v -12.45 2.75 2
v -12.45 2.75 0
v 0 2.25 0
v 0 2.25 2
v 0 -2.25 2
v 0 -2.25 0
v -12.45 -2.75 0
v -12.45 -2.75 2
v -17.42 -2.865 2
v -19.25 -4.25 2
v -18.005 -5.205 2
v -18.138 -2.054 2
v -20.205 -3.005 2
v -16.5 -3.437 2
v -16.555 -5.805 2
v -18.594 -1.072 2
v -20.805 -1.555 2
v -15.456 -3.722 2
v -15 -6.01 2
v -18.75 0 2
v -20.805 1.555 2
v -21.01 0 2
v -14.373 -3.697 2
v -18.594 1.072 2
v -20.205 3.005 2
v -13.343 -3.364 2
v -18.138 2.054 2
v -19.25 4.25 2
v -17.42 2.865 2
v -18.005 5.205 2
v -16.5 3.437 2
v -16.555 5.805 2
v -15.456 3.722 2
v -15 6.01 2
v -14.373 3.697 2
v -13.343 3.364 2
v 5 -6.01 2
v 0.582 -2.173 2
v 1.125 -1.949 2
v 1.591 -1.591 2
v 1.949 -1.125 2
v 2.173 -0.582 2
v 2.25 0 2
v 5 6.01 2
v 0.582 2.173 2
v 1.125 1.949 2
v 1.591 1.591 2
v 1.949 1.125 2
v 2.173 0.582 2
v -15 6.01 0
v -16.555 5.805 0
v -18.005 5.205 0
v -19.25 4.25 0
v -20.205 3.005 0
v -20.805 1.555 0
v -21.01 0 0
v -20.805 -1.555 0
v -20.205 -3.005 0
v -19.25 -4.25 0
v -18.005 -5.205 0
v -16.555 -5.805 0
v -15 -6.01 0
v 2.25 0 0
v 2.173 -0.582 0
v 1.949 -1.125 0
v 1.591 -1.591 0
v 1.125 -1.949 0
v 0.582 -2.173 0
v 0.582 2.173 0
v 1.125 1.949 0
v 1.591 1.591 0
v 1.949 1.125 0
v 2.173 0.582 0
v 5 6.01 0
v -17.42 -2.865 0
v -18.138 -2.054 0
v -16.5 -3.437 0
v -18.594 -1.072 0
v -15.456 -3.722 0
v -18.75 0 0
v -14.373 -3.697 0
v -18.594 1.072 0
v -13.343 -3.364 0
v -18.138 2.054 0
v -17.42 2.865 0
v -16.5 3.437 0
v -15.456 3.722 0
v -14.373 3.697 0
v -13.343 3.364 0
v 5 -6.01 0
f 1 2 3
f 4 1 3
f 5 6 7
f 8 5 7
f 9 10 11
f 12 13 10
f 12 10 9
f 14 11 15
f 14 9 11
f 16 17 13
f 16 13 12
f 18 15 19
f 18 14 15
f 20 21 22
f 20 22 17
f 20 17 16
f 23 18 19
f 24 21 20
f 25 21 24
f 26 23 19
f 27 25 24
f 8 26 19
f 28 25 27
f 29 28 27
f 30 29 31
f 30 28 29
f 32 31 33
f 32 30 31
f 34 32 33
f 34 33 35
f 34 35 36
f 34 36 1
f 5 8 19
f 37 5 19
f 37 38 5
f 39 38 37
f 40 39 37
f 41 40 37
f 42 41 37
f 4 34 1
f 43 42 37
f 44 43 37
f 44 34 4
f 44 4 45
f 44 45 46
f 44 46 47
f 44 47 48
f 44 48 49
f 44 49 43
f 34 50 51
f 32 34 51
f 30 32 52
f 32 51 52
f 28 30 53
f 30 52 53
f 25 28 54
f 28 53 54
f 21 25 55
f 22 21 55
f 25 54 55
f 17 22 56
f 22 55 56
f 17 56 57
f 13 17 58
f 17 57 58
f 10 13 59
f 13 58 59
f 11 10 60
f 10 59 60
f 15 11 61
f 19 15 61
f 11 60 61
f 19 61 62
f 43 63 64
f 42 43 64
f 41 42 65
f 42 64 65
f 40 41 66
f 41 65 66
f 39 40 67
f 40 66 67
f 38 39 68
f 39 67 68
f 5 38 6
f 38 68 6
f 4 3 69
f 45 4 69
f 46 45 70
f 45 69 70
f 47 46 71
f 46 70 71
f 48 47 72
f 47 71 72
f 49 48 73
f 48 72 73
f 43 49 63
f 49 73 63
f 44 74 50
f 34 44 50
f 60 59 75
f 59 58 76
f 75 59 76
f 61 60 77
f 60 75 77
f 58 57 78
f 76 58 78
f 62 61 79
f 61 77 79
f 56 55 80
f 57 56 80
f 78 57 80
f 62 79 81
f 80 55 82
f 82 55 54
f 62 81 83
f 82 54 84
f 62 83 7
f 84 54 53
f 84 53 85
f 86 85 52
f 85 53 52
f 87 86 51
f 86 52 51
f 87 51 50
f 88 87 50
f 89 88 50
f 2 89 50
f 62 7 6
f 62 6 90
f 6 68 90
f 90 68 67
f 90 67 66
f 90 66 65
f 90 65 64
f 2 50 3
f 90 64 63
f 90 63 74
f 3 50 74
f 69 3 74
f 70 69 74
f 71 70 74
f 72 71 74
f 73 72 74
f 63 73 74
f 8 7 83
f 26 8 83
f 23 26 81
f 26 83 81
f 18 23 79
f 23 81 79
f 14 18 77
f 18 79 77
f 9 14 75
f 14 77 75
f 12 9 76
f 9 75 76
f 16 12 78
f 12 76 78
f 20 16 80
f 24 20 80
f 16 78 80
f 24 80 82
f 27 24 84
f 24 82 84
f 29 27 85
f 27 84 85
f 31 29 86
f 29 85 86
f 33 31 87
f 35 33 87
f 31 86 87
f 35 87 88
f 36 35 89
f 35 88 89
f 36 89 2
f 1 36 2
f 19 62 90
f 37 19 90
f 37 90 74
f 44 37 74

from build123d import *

# Parameters (mm, degrees)
BOSS_EXTRUDE1_DEPTH = 2


with BuildPart() as part:
    # Sketch1 → Boss-Extrude1 (new body)
    with BuildSketch(Plane.XY):
        with BuildLine():
            Line((5, 6.009754879), (-15, 6.009754879))
            ThreePointArc((-15, 6.009754879), (-21.009754879, 0), (-15, -6.009754879))
            Line((-15, -6.009754879), (5, -6.009754879))
            Line((5, -6.009754879), (5, 6.009754879))
        make_face()
        with BuildLine():
            ThreePointArc((-12.450490243, -2.75), (-18.75, 0), (-12.450490243, 2.75))
            Line((-12.450490243, 2.75), (0, 2.25))
            ThreePointArc((0, 2.25), (1.590990258, 1.590990258), (2.25, 0))
            ThreePointArc((2.25, 0), (1.590990258, -1.590990258), (0, -2.25))
            Line((0, -2.25), (-12.450490243, -2.75))
        make_face(mode=Mode.SUBTRACT)
    extrude(amount=BOSS_EXTRUDE1_DEPTH)


solid = part.part
